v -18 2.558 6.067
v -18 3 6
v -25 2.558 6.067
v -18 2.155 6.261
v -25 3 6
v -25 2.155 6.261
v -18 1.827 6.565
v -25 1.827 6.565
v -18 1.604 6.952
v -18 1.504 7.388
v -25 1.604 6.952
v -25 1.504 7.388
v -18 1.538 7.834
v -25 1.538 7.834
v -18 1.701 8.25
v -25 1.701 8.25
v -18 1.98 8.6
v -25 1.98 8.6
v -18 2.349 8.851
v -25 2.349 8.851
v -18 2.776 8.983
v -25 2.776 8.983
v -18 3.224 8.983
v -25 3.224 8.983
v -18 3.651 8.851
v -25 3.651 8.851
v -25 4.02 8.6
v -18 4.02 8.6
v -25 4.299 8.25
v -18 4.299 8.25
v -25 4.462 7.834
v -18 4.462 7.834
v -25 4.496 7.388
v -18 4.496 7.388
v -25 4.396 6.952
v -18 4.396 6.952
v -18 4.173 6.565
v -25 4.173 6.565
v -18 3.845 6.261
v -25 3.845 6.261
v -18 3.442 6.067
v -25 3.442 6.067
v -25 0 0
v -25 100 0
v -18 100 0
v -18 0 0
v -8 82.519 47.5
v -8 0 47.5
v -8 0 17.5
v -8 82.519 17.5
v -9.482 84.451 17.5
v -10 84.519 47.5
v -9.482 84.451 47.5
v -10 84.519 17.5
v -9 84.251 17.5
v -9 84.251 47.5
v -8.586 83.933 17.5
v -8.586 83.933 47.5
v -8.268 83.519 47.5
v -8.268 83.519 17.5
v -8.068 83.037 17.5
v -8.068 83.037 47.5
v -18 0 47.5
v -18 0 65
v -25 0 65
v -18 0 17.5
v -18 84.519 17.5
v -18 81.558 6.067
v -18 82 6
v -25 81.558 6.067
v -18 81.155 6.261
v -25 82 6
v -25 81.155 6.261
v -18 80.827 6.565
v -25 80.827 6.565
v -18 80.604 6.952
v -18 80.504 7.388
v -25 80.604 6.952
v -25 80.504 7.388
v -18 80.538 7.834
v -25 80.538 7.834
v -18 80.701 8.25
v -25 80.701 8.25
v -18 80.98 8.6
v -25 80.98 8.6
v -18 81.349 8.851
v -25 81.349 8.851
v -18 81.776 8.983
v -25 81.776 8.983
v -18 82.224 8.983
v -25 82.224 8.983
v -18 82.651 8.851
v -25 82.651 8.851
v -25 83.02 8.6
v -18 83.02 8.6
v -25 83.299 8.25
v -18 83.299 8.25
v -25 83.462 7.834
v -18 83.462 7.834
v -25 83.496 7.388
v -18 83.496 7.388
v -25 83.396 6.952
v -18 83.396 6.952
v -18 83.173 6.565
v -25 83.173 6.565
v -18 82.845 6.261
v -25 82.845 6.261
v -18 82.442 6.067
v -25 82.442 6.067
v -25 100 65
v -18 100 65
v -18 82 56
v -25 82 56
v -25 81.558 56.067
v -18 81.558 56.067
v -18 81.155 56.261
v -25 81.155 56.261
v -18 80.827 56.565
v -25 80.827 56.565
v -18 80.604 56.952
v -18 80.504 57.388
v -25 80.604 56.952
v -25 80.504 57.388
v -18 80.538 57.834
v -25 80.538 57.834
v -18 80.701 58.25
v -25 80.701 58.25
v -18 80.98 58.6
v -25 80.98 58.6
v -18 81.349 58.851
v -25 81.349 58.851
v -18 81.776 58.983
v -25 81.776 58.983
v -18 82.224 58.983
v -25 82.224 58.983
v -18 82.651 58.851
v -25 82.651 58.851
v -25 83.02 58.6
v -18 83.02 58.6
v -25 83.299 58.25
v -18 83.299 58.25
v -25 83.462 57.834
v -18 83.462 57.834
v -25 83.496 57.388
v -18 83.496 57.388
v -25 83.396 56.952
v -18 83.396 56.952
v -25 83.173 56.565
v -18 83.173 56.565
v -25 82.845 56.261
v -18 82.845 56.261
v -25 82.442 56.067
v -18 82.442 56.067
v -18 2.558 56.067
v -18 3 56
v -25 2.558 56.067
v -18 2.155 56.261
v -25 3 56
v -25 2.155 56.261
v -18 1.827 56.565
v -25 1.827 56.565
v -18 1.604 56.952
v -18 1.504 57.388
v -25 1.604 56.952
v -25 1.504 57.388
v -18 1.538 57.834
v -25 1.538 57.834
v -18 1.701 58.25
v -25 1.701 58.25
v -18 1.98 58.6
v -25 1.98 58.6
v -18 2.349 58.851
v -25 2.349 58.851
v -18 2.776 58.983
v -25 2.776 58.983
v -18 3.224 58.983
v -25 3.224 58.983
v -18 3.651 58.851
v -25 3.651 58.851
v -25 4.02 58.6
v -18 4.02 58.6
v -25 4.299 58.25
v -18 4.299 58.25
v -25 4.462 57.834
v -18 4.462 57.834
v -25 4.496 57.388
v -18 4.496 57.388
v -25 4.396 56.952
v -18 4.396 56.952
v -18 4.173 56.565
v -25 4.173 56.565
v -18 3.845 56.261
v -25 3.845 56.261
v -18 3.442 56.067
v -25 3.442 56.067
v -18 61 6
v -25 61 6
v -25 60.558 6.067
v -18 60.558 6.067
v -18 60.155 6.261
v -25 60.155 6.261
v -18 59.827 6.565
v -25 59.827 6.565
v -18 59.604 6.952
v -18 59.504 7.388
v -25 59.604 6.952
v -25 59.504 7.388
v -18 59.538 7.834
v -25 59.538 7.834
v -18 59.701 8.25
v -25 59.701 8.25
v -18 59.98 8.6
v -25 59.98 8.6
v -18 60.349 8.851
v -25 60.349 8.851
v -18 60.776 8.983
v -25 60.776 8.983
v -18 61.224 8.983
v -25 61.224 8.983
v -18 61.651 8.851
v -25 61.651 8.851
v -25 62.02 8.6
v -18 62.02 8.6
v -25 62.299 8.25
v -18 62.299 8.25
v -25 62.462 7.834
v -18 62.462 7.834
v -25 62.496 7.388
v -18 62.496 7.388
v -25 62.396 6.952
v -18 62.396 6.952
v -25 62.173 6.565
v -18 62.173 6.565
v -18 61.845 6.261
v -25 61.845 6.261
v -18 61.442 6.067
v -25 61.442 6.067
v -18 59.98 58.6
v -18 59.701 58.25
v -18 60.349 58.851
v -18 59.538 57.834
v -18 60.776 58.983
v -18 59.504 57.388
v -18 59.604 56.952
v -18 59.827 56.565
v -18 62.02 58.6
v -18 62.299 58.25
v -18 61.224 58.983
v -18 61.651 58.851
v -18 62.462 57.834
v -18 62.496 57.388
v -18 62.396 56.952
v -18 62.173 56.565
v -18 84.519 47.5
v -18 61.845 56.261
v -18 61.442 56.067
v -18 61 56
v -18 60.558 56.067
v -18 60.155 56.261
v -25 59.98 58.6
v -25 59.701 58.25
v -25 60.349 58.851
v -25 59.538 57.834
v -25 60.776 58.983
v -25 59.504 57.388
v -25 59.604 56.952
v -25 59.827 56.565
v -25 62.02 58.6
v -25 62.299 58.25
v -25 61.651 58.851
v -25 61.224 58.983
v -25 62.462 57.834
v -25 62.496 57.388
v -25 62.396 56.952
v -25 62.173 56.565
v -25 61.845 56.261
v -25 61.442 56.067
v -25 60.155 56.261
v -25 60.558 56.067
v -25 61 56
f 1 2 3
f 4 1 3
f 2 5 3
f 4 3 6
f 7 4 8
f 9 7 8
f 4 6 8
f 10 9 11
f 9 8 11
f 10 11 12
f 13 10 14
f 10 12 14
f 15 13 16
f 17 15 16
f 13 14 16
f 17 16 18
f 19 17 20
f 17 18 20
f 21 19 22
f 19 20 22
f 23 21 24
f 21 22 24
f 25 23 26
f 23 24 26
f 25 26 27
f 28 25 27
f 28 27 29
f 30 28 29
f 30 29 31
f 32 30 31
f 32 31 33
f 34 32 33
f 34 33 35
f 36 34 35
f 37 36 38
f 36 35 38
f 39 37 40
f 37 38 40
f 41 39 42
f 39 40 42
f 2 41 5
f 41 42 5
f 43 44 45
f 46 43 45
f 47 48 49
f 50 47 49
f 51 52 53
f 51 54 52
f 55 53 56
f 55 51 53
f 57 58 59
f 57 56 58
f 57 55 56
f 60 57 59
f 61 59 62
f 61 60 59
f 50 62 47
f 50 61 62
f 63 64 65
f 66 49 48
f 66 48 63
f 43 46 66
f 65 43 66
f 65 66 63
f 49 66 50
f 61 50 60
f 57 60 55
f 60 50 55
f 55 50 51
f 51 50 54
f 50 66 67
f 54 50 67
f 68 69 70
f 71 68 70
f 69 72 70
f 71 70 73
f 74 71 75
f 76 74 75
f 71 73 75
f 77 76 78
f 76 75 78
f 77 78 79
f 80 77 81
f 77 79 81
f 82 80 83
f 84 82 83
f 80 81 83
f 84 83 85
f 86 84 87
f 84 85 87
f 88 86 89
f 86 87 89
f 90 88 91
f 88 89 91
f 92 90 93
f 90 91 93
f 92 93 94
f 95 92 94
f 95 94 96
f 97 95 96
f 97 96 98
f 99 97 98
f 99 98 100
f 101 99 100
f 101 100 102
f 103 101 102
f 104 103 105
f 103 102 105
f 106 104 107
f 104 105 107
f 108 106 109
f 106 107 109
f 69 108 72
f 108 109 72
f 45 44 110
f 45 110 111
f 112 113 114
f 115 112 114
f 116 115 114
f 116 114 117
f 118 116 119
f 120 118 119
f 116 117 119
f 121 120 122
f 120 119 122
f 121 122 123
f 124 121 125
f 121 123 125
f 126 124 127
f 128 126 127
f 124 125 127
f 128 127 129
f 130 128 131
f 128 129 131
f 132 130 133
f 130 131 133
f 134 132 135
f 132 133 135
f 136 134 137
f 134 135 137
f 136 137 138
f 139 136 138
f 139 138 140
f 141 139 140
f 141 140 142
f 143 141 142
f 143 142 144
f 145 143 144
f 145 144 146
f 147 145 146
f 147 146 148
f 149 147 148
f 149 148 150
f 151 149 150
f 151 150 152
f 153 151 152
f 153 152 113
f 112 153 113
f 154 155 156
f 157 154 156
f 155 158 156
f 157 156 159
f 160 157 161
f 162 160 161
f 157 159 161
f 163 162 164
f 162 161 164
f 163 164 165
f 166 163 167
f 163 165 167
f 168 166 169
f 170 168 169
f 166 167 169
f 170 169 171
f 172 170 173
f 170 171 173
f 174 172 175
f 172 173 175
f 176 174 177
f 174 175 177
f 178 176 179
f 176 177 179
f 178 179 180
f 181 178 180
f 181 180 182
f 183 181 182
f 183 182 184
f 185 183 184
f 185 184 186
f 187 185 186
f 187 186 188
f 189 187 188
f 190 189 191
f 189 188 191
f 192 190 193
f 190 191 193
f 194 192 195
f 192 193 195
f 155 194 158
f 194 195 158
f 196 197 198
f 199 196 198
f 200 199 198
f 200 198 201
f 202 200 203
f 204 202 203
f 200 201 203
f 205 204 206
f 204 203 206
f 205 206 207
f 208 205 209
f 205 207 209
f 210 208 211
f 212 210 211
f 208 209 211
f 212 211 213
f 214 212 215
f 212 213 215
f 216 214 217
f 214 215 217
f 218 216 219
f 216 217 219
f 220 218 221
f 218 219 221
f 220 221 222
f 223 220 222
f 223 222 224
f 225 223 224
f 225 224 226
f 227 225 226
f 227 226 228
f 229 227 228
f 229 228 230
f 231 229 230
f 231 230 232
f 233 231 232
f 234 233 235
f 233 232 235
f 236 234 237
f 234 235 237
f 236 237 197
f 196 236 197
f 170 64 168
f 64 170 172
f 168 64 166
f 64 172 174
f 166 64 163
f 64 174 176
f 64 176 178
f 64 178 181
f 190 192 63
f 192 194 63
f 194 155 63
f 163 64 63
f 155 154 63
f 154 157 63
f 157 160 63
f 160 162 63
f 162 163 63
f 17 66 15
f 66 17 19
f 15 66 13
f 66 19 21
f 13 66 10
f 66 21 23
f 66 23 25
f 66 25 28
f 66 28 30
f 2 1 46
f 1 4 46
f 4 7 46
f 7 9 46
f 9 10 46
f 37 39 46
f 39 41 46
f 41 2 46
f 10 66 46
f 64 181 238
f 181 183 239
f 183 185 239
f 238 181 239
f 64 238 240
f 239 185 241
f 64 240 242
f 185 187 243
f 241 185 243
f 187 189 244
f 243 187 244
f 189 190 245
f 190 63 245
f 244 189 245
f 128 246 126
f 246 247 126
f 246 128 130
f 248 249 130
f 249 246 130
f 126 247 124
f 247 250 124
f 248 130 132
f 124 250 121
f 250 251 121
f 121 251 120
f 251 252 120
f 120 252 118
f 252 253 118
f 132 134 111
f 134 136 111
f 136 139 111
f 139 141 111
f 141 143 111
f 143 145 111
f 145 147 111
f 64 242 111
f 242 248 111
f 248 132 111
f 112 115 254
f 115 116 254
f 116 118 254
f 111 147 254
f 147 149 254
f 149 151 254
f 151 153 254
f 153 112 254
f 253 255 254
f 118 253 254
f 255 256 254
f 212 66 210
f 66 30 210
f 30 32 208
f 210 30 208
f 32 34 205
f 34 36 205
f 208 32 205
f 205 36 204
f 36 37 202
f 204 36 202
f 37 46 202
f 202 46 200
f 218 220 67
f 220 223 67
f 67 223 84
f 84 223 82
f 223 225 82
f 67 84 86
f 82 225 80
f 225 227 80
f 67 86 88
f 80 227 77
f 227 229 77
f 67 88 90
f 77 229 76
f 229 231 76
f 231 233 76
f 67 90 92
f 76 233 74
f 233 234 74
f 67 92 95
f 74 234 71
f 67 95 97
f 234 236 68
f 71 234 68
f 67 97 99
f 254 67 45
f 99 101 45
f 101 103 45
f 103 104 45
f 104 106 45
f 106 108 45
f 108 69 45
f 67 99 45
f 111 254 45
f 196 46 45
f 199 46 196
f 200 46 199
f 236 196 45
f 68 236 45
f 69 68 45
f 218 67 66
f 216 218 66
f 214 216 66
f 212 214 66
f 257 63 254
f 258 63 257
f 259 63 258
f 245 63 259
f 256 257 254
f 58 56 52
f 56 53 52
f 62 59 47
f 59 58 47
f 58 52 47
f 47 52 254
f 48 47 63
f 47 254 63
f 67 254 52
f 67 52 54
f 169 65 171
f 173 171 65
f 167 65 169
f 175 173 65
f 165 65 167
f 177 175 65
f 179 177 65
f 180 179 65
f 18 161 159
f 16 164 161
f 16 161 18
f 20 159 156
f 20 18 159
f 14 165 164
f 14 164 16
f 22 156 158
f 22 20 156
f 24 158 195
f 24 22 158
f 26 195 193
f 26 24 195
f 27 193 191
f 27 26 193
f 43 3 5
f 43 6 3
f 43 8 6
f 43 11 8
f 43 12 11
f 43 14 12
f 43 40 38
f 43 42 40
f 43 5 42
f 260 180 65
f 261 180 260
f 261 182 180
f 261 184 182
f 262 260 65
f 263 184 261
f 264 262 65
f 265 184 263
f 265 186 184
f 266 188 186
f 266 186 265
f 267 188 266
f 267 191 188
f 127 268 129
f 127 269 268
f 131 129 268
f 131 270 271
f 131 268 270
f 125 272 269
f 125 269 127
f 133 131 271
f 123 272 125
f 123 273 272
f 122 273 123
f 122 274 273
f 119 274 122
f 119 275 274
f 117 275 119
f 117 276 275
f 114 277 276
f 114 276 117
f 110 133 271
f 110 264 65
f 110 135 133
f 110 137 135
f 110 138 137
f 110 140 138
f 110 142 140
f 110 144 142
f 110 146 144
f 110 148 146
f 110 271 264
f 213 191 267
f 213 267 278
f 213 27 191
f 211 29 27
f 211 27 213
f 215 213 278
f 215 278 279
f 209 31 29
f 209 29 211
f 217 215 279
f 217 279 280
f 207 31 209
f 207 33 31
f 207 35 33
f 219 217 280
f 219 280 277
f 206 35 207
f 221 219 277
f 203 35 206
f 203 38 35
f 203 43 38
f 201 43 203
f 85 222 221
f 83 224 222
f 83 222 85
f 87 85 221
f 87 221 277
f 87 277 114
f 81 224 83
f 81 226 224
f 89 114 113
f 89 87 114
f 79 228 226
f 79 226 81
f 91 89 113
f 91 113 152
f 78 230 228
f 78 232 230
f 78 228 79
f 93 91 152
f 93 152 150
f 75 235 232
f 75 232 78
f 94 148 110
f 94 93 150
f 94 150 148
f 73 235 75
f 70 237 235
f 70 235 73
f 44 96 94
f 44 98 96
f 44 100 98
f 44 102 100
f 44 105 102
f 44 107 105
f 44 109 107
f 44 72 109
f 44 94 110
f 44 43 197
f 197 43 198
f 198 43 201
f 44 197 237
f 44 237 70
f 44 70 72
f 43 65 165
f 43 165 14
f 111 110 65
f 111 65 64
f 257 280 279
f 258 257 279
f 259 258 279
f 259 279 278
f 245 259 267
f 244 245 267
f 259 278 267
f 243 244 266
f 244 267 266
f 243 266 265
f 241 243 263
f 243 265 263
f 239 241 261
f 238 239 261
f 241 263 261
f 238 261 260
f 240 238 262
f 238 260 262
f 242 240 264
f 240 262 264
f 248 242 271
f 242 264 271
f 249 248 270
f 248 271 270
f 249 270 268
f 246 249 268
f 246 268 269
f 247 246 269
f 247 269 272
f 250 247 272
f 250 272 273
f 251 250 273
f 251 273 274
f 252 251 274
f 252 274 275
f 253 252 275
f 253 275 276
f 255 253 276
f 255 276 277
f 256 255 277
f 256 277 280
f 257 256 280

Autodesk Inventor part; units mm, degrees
ref_plane "YZ Plane" through (0, 0, 0) normal (1, 0, 0) x (0, 1, 0)
ref_plane "XZ Plane" through (0, 0, 0) normal (0, 1, 0) x (-1, 0, 0)
ref_plane "XY Plane" through (0, 0, 0) normal (0, 0, 1) x (1, 0, 0)
sketch "Sketch1" plane through (0, 0, 0) normal (0, 0, 1) x (1, 0, 0)
  line L0 (0, 0) -> (-25, 0)
  line L1 (-25, 0) -> (-25, 100)
  line L2 (-25, 100) -> (0, 100)
  line L3 (0, 100) -> (0, 0)
  line L4 (0, 0) -> (-18, 0)
  line L5 (-18, 0) -> (-18, 85)
  line L6 (0, 85) -> (0, 0)
  line L7 (0, 85) -> (0, 65)
  line L8 (-18, 85) -> (-18, 100)
  point P0 (-18, 0)
  point P1 (-18, 92.5)
  dimension "d0" = 25
  dimension "d1" = 100
  dimension "d6" = 20
  dimension "d78" = 7
extrude "Extrusion1" add sketch "Sketch1" along normal blind 65 contours L0 L1 L2 L8 L5
sketch "Sketch2" plane through (-18, 0, 0) normal (1, 0, 0) x (0, 0, -1)
  line L0 (0, 0) -> (-65, 0) projected
  line L1 (0, 100) -> (-65, 100) projected
  line L2 (-47.5, 0) -> (-17.5, 0)
  line L3 (-17.5, 0) -> (-17.5, 100)
  line L4 (-17.5, 100) -> (-47.5, 100)
  line L5 (-47.5, 100) -> (-47.5, 0)
  line L6 (-65, 0) -> (-65, 100) projected
  line L7 (0, 0) -> (0, 100) projected
  line L8 (-47.5, 84.5192) -> (-17.5, 84.5192)
  dimension "d8" = 30
  dimension "d9" = 17.5
  dimension "d10" = 17.5
extrude "Extrusion2" add sketch "Sketch2" along normal blind 10 contours L0 L5 L8 L3
sketch "Sketch6" plane through (-8, 0, 0) normal (1, 0, 0) x (0, 0, -1)
  line L0 (0, 0) -> (-65, 0) projected
  line L1 (-60.5, 0) -> (-4.5, 0)
  line L2 (-4.5, 0) -> (-4.5, 85)
  line L3 (-4.5, 85) -> (-60.5, 85)
  line L4 (-60.5, 85) -> (-60.5, 0)
  line L5 (0, 0) -> (0, 100) projected
  line L6 (-65, 0) -> (-65, 100) projected
  line L7 (-57.5, 0) -> (-7.5, 0)
  line L8 (-7.5, 0) -> (-7.5, 82)
  line L9 (-7.5, 82) -> (-57.5, 82)
  line L10 (-57.5, 82) -> (-57.5, 0)
  line L11 (-57.5, 61) -> (-7.5, 61)
  line L12 (-57.5, 3) -> (-7.5, 3)
  point P0 (-32.5, 3)
  dimension "d27" = 56
  dimension "d28" = 85
  dimension "d29" = 4.5
  dimension "d30" = 4.5
  dimension "d31" = 50
  dimension "d32" = 3
  dimension "d33" = 3
  dimension "d34" = 61
  dimension "d49" = 3
hole "Hole3" at (-8, 61, 7.5) direction (-1, 0, 0) diameter 3 depth 40
hole "Hole4" at (-8, 82, 7.5) direction (-1, 0, 0) diameter 3 depth 40
hole "Hole5" at (-8, 3, 7.5) direction (-1, 0, 0) diameter 3 depth 40
hole "Hole6" at (-8, 3, 57.5) direction (-1, 0, 0) diameter 3 depth 40
hole "Hole7" at (-8, 61, 57.5) direction (-1, 0, 0) diameter 3 depth 40
hole "Hole8" at (-8, 82, 57.5) direction (-1, 0, 0) diameter 3 depth 40
fillet "Fillet1" radius 2 1 edges at (-8, 84.5192, 32.5)
properties part number "pi_holder"
